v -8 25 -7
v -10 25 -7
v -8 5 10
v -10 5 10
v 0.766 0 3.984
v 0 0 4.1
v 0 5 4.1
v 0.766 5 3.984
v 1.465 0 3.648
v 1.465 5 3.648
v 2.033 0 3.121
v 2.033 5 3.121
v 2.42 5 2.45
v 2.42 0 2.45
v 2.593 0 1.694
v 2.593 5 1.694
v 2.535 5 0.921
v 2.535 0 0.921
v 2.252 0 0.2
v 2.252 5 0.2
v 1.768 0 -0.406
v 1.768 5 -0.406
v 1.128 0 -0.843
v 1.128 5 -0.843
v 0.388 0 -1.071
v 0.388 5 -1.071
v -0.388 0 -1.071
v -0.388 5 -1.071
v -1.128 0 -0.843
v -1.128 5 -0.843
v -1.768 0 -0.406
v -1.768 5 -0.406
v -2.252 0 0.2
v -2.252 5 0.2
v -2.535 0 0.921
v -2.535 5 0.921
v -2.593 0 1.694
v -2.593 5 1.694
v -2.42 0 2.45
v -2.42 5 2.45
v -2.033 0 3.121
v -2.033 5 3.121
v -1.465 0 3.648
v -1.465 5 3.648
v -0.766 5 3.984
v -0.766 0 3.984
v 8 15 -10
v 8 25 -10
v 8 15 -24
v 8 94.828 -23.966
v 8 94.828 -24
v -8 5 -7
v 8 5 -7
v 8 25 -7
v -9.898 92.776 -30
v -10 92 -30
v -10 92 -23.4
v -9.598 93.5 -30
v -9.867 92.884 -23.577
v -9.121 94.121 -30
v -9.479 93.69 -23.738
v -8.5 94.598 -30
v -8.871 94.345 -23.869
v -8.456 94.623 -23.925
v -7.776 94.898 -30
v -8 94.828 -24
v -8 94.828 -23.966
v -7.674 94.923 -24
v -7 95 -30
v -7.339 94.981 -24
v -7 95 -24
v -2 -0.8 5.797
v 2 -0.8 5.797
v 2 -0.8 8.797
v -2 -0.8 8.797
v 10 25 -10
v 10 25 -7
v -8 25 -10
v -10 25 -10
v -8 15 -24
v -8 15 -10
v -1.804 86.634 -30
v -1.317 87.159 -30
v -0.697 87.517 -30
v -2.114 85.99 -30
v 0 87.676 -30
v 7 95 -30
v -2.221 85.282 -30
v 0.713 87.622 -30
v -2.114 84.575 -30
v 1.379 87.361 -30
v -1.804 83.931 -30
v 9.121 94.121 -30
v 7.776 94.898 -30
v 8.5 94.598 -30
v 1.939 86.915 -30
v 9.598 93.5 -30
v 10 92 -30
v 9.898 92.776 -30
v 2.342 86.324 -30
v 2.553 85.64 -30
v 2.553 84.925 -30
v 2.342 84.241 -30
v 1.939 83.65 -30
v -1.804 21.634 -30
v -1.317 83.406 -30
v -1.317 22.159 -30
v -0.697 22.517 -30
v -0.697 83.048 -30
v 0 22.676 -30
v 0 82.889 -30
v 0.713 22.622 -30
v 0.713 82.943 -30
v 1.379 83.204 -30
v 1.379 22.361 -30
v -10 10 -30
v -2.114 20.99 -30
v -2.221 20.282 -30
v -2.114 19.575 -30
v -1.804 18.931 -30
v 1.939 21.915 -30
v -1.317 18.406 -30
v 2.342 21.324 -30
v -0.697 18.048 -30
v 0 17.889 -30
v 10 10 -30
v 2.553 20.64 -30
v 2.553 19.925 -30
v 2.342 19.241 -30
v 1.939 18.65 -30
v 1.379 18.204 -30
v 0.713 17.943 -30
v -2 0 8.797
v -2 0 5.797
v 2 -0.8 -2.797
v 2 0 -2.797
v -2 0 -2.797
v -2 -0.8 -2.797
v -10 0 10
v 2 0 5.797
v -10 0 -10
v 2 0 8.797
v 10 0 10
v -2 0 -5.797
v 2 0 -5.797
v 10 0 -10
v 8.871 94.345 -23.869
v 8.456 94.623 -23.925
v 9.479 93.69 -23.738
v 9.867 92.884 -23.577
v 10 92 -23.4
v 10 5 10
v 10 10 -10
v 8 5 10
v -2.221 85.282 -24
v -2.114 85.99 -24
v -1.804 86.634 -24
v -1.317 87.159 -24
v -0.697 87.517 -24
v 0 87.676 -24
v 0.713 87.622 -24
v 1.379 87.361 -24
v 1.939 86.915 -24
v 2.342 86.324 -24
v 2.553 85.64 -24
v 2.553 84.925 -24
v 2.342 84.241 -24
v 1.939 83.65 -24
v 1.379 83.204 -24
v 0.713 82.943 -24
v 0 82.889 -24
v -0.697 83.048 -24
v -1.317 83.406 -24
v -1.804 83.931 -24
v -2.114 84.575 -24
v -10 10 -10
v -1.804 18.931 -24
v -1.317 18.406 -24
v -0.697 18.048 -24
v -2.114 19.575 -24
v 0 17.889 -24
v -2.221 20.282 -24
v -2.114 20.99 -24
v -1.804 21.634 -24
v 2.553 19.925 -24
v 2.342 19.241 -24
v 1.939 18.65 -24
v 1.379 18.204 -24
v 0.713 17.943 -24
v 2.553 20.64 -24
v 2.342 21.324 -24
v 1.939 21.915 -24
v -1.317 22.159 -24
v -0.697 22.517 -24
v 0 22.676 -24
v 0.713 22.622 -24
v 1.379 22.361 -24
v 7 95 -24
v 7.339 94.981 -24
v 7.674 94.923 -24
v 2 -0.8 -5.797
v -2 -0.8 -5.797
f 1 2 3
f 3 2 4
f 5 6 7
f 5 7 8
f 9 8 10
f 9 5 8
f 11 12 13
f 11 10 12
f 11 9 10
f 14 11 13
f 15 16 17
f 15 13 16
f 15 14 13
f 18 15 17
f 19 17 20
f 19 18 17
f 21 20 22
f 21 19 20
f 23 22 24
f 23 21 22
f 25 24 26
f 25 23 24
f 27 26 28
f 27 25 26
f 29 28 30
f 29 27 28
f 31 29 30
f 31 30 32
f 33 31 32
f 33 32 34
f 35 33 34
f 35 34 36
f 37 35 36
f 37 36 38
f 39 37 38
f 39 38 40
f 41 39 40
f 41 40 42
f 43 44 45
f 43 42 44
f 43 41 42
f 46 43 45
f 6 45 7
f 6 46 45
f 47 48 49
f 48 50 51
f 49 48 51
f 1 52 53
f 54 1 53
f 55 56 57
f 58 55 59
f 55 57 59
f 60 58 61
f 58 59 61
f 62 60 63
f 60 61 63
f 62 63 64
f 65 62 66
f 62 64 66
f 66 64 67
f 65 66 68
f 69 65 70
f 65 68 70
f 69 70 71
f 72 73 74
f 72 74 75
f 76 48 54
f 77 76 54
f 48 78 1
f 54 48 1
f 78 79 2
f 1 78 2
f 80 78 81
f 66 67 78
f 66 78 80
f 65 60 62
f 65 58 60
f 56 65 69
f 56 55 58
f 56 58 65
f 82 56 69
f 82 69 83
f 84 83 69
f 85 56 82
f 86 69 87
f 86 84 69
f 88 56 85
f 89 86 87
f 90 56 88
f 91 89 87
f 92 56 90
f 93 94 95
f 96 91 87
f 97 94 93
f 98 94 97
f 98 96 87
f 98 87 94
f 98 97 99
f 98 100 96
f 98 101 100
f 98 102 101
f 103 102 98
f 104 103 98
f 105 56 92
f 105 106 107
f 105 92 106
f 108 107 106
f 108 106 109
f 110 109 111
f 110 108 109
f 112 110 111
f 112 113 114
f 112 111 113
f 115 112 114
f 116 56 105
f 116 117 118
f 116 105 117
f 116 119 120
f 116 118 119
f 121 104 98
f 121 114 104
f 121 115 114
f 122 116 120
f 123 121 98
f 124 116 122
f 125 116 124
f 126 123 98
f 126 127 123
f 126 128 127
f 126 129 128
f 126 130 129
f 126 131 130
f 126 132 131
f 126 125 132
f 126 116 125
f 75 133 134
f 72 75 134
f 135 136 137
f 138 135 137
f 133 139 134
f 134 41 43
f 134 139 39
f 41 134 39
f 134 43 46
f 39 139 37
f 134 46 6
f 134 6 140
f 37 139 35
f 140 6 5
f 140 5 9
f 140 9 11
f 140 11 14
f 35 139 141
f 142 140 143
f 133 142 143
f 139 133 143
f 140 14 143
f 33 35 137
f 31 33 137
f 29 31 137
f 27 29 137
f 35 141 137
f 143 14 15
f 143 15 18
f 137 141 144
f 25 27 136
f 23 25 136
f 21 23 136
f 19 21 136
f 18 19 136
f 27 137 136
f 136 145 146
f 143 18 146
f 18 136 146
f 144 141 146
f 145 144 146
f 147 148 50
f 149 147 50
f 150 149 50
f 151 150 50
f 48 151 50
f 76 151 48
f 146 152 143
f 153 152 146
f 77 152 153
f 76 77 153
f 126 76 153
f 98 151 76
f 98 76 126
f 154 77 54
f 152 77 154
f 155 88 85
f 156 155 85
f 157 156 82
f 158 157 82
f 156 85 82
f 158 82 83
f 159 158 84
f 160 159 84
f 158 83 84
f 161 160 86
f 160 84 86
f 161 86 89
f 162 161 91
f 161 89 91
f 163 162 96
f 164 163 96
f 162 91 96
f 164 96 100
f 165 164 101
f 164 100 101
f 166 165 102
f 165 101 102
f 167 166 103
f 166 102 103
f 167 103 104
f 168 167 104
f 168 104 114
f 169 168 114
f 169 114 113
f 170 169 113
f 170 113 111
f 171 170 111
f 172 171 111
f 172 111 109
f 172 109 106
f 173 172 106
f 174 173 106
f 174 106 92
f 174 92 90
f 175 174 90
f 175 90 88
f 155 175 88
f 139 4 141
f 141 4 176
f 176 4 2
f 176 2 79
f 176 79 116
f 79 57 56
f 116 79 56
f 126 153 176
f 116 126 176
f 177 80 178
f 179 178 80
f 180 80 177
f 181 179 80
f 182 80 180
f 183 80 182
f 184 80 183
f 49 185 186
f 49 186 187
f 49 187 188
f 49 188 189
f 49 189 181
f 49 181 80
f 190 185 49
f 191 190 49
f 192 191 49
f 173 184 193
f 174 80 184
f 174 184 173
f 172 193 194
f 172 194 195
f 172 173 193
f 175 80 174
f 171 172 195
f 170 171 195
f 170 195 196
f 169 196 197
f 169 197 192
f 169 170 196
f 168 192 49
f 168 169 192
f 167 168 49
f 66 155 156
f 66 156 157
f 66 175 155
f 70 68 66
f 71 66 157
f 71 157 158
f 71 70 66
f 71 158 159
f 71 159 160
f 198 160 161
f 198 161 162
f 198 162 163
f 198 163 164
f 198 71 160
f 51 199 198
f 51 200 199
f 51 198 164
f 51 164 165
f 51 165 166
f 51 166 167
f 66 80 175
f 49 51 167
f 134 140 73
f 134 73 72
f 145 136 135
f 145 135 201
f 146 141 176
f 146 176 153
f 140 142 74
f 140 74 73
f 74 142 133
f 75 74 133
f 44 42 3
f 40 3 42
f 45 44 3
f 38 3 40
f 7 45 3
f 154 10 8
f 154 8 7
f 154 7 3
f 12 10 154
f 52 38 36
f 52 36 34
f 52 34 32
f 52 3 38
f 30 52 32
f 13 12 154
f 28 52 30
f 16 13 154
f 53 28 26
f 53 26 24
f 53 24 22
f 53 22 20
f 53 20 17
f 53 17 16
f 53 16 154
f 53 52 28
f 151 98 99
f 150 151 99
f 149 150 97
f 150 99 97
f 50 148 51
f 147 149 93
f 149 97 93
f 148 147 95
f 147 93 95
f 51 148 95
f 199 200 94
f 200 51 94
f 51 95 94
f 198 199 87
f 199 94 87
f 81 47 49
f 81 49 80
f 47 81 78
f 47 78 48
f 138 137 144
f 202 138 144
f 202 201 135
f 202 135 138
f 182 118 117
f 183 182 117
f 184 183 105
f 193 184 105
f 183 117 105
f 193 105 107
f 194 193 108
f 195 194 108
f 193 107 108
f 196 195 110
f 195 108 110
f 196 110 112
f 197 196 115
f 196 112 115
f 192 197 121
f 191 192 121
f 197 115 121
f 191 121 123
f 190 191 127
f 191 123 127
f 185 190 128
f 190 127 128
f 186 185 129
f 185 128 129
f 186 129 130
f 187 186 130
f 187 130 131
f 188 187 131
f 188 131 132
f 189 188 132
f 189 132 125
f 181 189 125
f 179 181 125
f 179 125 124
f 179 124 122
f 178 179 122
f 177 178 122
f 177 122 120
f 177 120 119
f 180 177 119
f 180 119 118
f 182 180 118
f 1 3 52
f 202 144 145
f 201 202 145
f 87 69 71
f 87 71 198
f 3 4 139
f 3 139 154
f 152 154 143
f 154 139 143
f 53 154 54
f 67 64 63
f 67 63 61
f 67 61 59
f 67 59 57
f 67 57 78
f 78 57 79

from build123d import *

# Parameters (mm, degrees)
SKETCH1_W               = 20
SKETCH1_H               = 20
BOSS_EXTRUDE1_DEPTH     = 5
SKETCH2_W               = 20
SKETCH2_H               = 3
BOSS_EXTRUDE2_DEPTH     = 20
CUT_EXTRUDE1_DEPTH      = 25.494897428
CUT_EXTRUDE1_DEPTH_BACK = 25.494897428
SKETCH3_R               = 2.6
BOSS_EXTRUDE3_DEPTH     = 2
BOSS_EXTRUDE4_DEPTH     = 2
SKETCH6_W               = 2
SKETCH6_H               = 3
SKETCH6_W_2             = 4
BOSS_EXTRUDE5_DEPTH     = 0.8
SKETCH9_W               = 20
SKETCH9_H               = 3
BOSS_EXTRUDE8_DEPTH     = 45
BOSS_EXTRUDE9_DEPTH     = 20
SKETCH13_W              = 20
SKETCH13_H              = 3
BOSS_EXTRUDE12_DEPTH    = 80
SKETCH16_W              = 3
SKETCH16_H              = 45
CUT_EXTRUDE3_DEPTH      = 80
SKETCH22_W              = 20
SKETCH22_H              = 80
BOSS_EXTRUDE15_DEPTH    = 3
BOSS_EXTRUDE16_DEPTH    = 2
BOSS_EXTRUDE17_DEPTH    = 2
FILLET2_R               = 3
SKETCH26_R              = 2.4
CUT_EXTRUDE5_DEPTH      = 9


with BuildPart() as part:
    # Sketch1 → Boss-Extrude1 (new body)
    with BuildSketch(Plane(origin=(0, 0, 0), x_dir=(1, 0, 0), z_dir=(0, 1, 0))):
        Rectangle(SKETCH1_W, SKETCH1_H)
    extrude(amount=BOSS_EXTRUDE1_DEPTH)

    # Sketch2 → Boss-Extrude2 (add)
    with BuildSketch(Plane(origin=(0, 5, 0), x_dir=(1, 0, 0), z_dir=(0, 1, 0))):
        with Locations((0, 8.5)):
            Rectangle(SKETCH2_W, SKETCH2_H)
    extrude(amount=BOSS_EXTRUDE2_DEPTH)

    # Sketch3 → Cut-Extrude1 (cut, two sides: drawn at the far end of the back side and taken through both)
    with BuildSketch(Plane(origin=(0, 5, 0), x_dir=(1, 0, 0), z_dir=(0, 1, 0)).offset(-CUT_EXTRUDE1_DEPTH_BACK)):
        with Locations(Location((0, -1.5, 0), (0, 0, 270))):
            Circle(SKETCH3_R)
    extrude(amount=CUT_EXTRUDE1_DEPTH + CUT_EXTRUDE1_DEPTH_BACK, mode=Mode.SUBTRACT)

    # Sketch4 → Boss-Extrude3 (add)
    with BuildSketch(Plane.ZY.offset(10)):
        Polygon((-7, 25), (10, 5), (-7, 5), align=None)
    extrude(amount=-BOSS_EXTRUDE3_DEPTH)

    # Sketch5 → Boss-Extrude4 (add)
    with BuildSketch(Plane(origin=(10, 0, 0), x_dir=(0, 0, -1), z_dir=(1, 0, 0))):
        Polygon((7, 25), (-10, 5), (7, 5), align=None)
    extrude(amount=-BOSS_EXTRUDE4_DEPTH)

    # Sketch6 → Boss-Extrude5 (add)
    with BuildSketch(Plane(origin=(0, 0, 0), x_dir=(-1, 0, 0), z_dir=(0, -1, 0))):
        with Locations((-1, 4.297300947)):
            Rectangle(SKETCH6_W, SKETCH6_H)
        with Locations((1, 4.297300947)):
            Rectangle(SKETCH6_W, SKETCH6_H)
        with Locations((0, -7.297300947)):
            Rectangle(SKETCH6_W_2, SKETCH6_H)
    extrude(amount=BOSS_EXTRUDE5_DEPTH)

    # Sketch9 → Boss-Extrude8 (add)
    with BuildSketch(Plane(origin=(0, 25, 0), x_dir=(1, 0, 0), z_dir=(0, 1, 0))):
        with Locations((0, 8.5)):
            Rectangle(SKETCH9_W, SKETCH9_H)
    extrude(amount=BOSS_EXTRUDE8_DEPTH)

    # Sketch12 → Boss-Extrude9 (add)
    with BuildSketch(Plane(origin=(0, 0, -10), x_dir=(-1, 0, 0), z_dir=(0, 0, -1))):
        Polygon((0, 10), (-10, 10), (-10, 15), (10, 15), (10, 10), align=None)
    extrude(amount=BOSS_EXTRUDE9_DEPTH)

    # Sketch13 → Boss-Extrude12 (add)
    with BuildSketch(Plane(origin=(0, 15, 0), x_dir=(1, 0, 0), z_dir=(0, 1, 0))):
        with Locations((0, 28.5)):
            Rectangle(SKETCH13_W, SKETCH13_H)
    extrude(amount=BOSS_EXTRUDE12_DEPTH)

    # Sketch16 → Cut-Extrude3 (cut)
    with BuildSketch(Plane.ZY.offset(10)):
        with Locations((-8.5, 47.5)):
            Rectangle(SKETCH16_W, SKETCH16_H)
    extrude(amount=-CUT_EXTRUDE3_DEPTH, mode=Mode.SUBTRACT)

    # Sketch22 → Boss-Extrude15 (add)
    with BuildSketch(Plane.XY.offset(-27)):
        with Locations((0, 55)):
            Rectangle(SKETCH22_W, SKETCH22_H)
    extrude(amount=BOSS_EXTRUDE15_DEPTH)

    # Sketch23 → Boss-Extrude16 (add)
    with BuildSketch(Plane.ZY.offset(10)):
        Polygon((-24, 95), (-10, 25), (-10, 15), (-24, 15), align=None)
    extrude(amount=-BOSS_EXTRUDE16_DEPTH)

    # Sketch24 → Boss-Extrude17 (add)
    with BuildSketch(Plane(origin=(10, 0, 0), x_dir=(0, 0, -1), z_dir=(1, 0, 0))):
        Polygon((24, 95), (10, 25), (10, 15), (24, 15), align=None)
    extrude(amount=-BOSS_EXTRUDE17_DEPTH)

    # Fillet2
    # the kernel refuses this fillet: 3 mm, written as the material it takes off along each edge
    with BuildSketch(Plane(origin=(-10, 95, -16.5), x_dir=(0, -1, 0), z_dir=(0, 0, -1)), Plane(origin=(10, 95, -37.5), x_dir=(0, -1, 0), z_dir=(0, 0, 1))) as fillet2_piece_1:
        with BuildLine():
            CenterArc((FILLET2_R, -FILLET2_R), FILLET2_R, 90, 90)
            Line((0, -FILLET2_R), (0, 0))
            Line((0, 0), (FILLET2_R, 0))
        make_face()
    extrude(amount=21, mode=Mode.SUBTRACT)

    # Sketch26 → Cut-Extrude5 (cut)
    with BuildSketch(Plane(origin=(0, 0, -30), x_dir=(-1, 0, 0), z_dir=(0, 0, -1))):
        with Locations((-0.179346542, 85.282473515)):
            Circle(SKETCH26_R)
        with Locations((-0.179346542, 20.282473515)):
            Circle(SKETCH26_R)
    extrude(amount=-CUT_EXTRUDE5_DEPTH, mode=Mode.SUBTRACT)


solid = part.part
